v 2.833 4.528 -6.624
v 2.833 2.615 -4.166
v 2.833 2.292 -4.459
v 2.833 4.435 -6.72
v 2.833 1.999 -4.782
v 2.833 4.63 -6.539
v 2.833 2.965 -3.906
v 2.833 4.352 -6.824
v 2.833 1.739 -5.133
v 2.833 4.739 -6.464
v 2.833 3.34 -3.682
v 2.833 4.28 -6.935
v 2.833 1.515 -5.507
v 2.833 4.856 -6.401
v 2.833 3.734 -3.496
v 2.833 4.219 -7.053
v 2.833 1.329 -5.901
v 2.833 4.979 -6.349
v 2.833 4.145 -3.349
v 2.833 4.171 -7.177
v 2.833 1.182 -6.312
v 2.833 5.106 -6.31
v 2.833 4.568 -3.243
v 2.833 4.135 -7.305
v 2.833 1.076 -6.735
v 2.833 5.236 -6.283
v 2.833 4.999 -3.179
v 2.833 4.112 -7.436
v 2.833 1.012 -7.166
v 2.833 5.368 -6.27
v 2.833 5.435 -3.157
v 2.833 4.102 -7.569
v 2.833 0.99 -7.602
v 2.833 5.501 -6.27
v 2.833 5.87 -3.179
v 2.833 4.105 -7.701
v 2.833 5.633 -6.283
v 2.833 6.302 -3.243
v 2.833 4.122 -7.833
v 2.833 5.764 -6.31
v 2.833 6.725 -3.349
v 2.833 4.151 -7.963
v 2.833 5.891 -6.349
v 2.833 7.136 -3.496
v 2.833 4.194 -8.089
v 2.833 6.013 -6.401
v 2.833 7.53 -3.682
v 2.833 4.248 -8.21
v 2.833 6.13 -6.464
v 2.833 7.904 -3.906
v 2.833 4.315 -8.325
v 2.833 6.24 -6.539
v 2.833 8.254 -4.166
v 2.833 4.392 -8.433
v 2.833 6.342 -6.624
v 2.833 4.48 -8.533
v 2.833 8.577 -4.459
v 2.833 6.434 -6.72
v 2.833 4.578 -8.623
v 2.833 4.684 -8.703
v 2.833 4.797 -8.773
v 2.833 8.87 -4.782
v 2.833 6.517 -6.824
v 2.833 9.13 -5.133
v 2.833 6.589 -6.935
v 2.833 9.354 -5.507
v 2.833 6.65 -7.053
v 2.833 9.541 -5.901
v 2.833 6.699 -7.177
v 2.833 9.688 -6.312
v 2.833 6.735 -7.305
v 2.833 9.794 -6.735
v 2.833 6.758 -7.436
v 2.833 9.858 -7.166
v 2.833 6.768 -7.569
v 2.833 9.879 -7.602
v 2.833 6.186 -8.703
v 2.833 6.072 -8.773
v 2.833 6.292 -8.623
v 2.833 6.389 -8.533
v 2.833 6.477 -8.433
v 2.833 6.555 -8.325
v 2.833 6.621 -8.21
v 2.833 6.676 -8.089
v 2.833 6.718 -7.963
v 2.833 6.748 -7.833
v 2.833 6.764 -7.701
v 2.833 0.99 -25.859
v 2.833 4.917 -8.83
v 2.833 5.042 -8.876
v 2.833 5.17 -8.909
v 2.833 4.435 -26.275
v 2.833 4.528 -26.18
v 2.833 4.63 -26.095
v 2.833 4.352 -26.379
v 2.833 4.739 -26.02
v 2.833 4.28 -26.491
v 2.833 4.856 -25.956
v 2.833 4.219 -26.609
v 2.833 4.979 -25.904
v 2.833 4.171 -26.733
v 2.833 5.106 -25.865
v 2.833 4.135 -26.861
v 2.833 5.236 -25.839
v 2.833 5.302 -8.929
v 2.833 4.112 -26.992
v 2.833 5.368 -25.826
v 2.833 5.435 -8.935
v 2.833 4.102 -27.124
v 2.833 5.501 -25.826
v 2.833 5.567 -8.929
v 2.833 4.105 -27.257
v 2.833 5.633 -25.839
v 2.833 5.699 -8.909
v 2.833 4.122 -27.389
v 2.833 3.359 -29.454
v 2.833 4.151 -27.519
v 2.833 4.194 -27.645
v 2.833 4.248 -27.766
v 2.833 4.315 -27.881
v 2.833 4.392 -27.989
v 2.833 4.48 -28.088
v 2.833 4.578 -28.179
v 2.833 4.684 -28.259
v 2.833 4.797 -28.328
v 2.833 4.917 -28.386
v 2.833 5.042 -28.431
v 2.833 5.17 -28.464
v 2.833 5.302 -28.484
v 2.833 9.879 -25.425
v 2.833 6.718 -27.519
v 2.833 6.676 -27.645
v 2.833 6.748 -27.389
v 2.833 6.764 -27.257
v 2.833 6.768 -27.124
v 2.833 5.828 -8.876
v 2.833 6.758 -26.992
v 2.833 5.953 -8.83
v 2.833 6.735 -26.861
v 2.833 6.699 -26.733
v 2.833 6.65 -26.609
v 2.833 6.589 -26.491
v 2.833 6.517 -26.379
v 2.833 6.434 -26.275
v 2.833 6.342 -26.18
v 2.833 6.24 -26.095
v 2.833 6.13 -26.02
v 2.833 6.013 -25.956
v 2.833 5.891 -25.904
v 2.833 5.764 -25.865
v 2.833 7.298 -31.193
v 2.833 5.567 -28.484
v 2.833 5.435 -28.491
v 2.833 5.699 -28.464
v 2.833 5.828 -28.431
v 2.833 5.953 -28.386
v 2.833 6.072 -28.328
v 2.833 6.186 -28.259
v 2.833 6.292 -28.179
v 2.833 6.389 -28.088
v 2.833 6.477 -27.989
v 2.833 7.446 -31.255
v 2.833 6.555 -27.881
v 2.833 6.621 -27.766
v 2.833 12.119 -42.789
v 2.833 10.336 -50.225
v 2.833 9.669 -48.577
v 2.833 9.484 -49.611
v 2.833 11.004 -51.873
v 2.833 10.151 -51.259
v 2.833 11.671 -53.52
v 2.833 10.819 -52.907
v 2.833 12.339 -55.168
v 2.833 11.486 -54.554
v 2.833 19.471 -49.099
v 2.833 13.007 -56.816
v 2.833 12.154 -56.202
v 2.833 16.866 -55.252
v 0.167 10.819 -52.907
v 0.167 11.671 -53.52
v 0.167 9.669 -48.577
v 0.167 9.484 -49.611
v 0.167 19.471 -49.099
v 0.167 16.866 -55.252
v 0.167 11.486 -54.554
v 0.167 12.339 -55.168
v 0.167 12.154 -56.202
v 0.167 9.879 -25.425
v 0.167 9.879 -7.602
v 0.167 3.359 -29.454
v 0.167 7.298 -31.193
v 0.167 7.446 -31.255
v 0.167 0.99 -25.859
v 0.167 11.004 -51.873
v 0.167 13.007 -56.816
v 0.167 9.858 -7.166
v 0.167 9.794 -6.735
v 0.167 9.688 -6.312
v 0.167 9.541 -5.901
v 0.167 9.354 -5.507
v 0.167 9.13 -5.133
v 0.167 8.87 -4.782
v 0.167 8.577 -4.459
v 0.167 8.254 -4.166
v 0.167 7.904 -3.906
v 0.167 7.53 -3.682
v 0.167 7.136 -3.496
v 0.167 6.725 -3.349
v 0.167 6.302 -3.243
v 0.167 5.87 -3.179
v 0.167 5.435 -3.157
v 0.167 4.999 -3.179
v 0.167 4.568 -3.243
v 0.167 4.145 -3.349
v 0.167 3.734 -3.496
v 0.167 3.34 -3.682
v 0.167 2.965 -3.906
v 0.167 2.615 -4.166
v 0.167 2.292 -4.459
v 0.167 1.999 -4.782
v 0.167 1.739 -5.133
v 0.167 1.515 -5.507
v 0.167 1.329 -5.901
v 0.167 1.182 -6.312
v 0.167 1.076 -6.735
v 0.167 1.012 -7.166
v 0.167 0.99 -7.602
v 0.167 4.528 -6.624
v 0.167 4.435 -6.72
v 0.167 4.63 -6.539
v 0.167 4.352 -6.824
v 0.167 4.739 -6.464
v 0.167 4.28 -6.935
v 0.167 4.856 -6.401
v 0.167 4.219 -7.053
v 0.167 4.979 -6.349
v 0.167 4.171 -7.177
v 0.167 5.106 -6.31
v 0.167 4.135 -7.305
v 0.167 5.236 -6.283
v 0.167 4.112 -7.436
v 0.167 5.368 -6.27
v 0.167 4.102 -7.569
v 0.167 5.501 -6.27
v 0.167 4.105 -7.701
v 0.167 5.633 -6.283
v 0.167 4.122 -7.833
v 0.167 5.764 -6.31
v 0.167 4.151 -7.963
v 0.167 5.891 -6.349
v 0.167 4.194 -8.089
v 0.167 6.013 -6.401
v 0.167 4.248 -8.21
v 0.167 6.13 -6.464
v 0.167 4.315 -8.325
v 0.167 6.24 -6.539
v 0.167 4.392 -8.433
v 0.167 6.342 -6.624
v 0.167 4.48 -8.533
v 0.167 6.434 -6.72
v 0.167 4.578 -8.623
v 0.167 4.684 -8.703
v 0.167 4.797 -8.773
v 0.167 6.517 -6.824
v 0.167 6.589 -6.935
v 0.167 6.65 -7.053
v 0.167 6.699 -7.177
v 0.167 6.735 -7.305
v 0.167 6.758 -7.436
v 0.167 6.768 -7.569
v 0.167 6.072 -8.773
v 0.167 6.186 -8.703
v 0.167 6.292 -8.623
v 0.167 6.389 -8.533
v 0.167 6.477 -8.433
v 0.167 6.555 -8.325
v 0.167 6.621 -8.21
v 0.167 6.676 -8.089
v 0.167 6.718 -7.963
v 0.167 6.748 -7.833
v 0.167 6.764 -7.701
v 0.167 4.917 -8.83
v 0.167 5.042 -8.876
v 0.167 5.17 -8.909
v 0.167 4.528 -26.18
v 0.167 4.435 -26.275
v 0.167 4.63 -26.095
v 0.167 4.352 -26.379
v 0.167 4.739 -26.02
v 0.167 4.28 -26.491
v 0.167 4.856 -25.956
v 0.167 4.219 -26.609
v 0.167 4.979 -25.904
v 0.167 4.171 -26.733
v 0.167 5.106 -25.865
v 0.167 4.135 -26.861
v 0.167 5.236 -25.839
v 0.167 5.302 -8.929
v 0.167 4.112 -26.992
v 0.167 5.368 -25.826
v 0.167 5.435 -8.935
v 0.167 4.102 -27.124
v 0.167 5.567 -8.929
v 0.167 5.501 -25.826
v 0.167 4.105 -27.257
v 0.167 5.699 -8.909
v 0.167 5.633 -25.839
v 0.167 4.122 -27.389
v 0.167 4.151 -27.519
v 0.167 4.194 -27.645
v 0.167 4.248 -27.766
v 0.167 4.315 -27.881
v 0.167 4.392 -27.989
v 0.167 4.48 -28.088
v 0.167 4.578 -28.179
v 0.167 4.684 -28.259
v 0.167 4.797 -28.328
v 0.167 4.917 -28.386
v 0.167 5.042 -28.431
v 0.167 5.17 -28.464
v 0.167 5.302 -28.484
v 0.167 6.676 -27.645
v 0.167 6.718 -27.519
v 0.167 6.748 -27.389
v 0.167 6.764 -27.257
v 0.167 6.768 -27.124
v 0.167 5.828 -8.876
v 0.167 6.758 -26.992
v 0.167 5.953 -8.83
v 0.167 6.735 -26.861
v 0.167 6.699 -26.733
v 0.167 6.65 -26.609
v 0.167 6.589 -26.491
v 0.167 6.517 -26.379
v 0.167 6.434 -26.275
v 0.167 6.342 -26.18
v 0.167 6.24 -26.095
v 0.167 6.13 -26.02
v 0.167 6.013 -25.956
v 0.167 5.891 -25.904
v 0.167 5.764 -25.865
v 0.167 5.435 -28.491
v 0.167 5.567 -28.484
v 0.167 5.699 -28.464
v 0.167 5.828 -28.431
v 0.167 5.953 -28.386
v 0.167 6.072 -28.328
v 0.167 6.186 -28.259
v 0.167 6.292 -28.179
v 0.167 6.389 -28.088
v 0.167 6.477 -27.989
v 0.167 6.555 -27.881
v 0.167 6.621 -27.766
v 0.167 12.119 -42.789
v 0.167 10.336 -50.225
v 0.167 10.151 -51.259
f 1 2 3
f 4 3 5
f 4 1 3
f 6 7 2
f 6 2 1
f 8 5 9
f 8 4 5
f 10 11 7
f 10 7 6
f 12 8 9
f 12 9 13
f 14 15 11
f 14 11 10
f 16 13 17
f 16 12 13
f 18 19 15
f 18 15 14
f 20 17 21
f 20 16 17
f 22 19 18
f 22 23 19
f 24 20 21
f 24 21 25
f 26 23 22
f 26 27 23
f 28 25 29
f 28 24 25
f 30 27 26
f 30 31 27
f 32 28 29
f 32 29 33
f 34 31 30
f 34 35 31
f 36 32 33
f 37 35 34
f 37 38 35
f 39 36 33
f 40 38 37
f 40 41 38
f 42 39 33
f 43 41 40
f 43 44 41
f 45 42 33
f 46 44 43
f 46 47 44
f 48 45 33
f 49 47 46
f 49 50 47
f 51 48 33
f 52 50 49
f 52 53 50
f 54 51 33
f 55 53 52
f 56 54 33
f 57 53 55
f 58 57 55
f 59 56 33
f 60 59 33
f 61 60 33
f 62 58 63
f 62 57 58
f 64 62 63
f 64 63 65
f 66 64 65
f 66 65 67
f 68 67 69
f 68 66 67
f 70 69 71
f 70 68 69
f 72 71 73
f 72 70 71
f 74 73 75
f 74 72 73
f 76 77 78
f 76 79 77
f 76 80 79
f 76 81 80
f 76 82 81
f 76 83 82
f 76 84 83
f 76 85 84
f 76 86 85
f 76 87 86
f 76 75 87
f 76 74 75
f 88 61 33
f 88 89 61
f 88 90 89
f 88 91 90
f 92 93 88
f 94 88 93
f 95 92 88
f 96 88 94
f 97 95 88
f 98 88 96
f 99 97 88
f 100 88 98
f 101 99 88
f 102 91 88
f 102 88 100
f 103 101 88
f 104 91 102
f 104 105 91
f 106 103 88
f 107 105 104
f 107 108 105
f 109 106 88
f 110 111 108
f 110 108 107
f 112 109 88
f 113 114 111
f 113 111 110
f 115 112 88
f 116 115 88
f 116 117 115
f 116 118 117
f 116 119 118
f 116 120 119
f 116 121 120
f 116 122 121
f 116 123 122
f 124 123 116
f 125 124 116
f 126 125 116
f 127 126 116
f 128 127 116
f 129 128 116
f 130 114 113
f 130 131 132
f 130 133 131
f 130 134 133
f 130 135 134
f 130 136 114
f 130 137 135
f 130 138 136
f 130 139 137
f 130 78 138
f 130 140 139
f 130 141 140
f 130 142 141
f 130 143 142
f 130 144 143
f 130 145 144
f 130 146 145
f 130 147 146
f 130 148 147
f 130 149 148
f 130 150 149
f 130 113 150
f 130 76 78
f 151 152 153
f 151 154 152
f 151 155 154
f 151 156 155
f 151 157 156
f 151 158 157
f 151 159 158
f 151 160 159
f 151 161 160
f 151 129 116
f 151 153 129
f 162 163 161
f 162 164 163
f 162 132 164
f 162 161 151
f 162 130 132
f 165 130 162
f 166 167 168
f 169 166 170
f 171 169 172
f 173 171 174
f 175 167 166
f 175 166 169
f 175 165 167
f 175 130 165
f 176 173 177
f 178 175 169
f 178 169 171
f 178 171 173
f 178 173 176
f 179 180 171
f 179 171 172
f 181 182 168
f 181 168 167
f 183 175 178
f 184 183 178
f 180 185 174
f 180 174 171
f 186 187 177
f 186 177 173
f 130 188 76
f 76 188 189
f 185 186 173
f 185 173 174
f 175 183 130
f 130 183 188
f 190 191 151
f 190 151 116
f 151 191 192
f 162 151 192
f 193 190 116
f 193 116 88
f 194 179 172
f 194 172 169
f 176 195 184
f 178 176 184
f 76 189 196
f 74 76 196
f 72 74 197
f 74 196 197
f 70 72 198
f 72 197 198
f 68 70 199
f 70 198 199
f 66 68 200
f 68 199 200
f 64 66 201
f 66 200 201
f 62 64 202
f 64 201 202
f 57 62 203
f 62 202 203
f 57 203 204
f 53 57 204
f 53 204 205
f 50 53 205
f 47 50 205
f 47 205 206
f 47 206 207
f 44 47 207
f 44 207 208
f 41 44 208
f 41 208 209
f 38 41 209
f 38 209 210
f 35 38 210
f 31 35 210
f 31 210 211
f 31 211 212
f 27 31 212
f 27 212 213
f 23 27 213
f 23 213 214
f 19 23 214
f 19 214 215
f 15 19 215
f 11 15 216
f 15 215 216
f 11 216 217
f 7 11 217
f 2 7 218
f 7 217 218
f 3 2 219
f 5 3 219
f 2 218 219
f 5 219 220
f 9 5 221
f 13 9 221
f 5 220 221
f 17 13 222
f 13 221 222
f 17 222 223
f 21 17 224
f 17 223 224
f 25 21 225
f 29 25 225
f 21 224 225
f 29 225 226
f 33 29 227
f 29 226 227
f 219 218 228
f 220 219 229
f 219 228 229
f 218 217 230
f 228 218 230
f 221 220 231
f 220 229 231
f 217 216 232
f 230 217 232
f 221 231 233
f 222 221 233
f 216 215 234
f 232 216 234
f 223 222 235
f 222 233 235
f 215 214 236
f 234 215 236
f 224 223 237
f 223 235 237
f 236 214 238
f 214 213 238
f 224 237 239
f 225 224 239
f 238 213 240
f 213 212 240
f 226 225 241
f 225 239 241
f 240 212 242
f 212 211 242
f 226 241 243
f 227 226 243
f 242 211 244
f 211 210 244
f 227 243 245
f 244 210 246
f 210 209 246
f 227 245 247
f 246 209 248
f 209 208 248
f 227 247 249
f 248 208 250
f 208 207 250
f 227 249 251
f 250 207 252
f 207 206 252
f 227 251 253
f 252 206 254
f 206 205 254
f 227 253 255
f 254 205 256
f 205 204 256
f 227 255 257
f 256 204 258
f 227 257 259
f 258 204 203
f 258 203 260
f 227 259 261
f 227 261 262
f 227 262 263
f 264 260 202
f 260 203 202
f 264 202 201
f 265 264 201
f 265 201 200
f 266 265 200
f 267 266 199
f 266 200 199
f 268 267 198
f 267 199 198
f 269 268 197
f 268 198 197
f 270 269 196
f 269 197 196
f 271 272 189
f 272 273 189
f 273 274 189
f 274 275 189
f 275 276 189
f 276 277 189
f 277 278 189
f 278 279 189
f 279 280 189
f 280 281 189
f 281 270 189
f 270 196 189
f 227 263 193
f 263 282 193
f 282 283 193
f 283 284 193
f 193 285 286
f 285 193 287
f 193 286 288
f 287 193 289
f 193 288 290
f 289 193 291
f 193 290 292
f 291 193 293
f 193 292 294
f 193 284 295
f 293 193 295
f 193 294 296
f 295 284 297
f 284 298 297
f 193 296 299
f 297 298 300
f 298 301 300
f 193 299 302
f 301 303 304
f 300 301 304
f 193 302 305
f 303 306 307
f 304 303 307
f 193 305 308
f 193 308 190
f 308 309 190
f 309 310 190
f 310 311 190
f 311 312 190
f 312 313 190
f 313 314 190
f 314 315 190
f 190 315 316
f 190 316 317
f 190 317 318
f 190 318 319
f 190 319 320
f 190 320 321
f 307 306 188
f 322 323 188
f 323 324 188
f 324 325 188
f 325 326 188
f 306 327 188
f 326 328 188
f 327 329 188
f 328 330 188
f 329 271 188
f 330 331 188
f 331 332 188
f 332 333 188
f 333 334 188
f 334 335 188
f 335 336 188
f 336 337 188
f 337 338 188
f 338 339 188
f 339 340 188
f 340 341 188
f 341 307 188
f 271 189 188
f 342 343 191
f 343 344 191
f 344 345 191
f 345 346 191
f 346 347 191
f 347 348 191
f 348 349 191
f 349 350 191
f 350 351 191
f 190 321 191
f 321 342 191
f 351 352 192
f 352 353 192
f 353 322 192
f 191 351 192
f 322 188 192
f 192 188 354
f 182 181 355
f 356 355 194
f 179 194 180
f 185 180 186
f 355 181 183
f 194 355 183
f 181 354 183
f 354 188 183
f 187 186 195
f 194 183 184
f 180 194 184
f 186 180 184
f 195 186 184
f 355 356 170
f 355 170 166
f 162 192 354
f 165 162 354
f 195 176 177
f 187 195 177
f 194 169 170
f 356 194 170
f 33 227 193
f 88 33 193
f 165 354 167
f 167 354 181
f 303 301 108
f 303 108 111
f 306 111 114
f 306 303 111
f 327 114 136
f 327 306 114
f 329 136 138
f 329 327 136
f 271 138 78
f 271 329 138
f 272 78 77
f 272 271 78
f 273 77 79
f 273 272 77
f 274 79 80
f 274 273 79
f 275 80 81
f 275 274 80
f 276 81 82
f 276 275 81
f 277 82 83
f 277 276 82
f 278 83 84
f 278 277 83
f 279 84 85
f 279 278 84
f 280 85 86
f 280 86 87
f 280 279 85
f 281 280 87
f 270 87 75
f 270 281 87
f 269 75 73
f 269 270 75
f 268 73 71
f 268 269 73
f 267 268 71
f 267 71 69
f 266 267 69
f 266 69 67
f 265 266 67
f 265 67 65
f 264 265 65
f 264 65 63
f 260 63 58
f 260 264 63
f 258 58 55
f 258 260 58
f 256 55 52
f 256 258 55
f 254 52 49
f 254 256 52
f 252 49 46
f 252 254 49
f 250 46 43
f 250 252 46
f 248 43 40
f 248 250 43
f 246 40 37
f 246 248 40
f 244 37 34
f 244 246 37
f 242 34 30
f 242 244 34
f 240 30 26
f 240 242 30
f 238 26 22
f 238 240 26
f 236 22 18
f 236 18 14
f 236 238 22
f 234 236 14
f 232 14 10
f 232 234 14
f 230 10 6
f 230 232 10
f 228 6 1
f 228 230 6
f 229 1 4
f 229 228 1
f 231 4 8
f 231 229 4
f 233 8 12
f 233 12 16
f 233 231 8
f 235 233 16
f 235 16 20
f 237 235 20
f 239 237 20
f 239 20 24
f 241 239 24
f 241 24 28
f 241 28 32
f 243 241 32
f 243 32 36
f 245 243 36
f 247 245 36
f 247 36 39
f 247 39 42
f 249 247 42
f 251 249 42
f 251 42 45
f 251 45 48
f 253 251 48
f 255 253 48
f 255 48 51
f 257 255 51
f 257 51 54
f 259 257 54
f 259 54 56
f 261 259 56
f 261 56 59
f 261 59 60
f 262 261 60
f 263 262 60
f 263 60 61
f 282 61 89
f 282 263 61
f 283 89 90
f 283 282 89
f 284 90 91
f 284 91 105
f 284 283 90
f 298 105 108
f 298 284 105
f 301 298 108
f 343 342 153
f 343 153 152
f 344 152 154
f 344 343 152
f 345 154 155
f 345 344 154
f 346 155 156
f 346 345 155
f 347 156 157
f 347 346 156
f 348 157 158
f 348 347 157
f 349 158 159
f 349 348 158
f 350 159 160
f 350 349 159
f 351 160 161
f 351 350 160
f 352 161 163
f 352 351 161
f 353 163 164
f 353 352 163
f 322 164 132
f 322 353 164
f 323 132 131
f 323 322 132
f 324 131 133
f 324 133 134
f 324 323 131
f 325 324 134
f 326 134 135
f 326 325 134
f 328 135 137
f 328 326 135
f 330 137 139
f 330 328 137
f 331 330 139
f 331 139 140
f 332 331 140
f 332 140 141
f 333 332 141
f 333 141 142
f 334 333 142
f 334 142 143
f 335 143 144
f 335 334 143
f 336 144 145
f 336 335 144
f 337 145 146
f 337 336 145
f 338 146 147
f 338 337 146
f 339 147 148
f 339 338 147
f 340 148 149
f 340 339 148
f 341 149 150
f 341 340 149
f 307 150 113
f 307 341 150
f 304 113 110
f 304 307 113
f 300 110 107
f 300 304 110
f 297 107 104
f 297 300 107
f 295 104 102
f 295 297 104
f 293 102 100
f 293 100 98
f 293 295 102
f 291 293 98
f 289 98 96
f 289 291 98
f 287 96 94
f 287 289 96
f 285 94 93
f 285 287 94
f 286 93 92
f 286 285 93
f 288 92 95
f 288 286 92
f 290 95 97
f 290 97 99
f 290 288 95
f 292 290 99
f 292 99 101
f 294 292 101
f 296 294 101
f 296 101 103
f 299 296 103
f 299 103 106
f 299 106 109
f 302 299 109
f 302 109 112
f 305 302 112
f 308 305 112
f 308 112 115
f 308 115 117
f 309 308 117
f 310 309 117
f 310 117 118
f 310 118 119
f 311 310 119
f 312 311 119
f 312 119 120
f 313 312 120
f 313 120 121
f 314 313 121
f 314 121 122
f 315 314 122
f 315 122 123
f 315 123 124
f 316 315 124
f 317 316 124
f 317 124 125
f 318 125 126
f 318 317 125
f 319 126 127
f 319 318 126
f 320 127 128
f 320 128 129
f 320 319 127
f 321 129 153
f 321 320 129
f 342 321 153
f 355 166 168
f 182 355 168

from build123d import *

# Parameters (mm, degrees)
SKETCH1_R             = 5
SKETCH1_R_2           = 1.5
BOSS_EXTRUDE1_DEPTH   = 3
BOSS_EXTRUDE2_START   = -3
BOSS_EXTRUDE2_DEPTH   = 3
CUT_EXTRUDE2_DEPTH    = 65.81382707
CORTAR_EXTRUIR1_DEPTH = 3
SCALE1_SCALE          = 0.888888889


# Read off the part's stored shape, not the designer's step: Cortar-Extruir1
with BuildPart() as part:
    # Sketch1 → Boss-Extrude1 (new body)
    # profile 1 of 3: a face of its own
    with BuildSketch(Plane(origin=(0, 0, 0), x_dir=(0, 0, -1), z_dir=(1, 0, 0))):
        with Locations((5, 5)):
            Circle(SKETCH1_R)
        with Locations((5, 5)):
            Circle(SKETCH1_R_2, mode=Mode.SUBTRACT)
    # profile 2 of 3: a face of its own
    with BuildSketch(Plane(origin=(0, 0, 0), x_dir=(0, 0, -1), z_dir=(1, 0, 0))):
        with BuildLine():
            ThreePointArc((10, 5), (8.535533906, 1.464466094), (5, 0))
            Line((5, 0), (27, 0))
            ThreePointArc((27, 0), (22, 5), (27, 10))
            Line((27, 10), (5, 10))
            ThreePointArc((5, 10), (8.535533906, 8.535533906), (10, 5))
        make_face()
    # profile 3 of 3: a face of its own
    with BuildSketch(Plane(origin=(0, 0, 0), x_dir=(0, 0, -1), z_dir=(1, 0, 0))):
        with Locations((27, 5)):
            Circle(SKETCH1_R)
        with Locations((27, 5)):
            Circle(SKETCH1_R_2, mode=Mode.SUBTRACT)
    extrude(amount=BOSS_EXTRUDE1_DEPTH)

    # Sketch2 → Boss-Extrude2 (add)
    with BuildSketch(Plane(origin=(3, 0, 0), x_dir=(0, 0, -1), z_dir=(1, 0, 0)).offset(BOSS_EXTRUDE2_START)):
        with BuildLine():
            ThreePointArc((27, 10), (29.694507461, 9.21184396), (31.53953799, 7.095851816))
            Line((31.53953799, 7.095851816), (31.610157793, 7.262674791))
            Line((31.610157793, 7.262674791), (44.585599673, 12.519851602))
            Line((44.585599673, 12.519851602), (51.097249205, 9.763328363))
            Line((51.097249205, 9.763328363), (60.365421977, 13.518454657))
            Line((60.365421977, 13.518454657), (56.610295683, 22.786627428))
            Line((56.610295683, 22.786627428), (25.051124858, 10))
            Line((25.051124858, 10), (27, 10))
        make_face()
        Polygon((60.365421977, 13.518454657), (51.097249205, 9.763328363), (51.333822162, 9.179433479), (60.601994933, 12.934559772), align=None)
    extrude(amount=BOSS_EXTRUDE2_DEPTH)

    # Sketch4 → Cut-Extrude2 (cut, through all)
    with BuildSketch(Plane(origin=(3, 0, 0), x_dir=(0, 0, -1), z_dir=(1, 0, 0))):
        Polygon((56.610295683, 22.786627428), (51.684261855, 20.790777803), (58.606145308, 17.8605936), align=None)
    extrude(amount=-CUT_EXTRUDE2_DEPTH, mode=Mode.SUBTRACT)

    # Cortar-Extruir1 outline → Cortar-Extruir1 (cut)
    with BuildSketch(Plane.YZ):
        with BuildLine():
            ThreePointArc((0, -27), (2.305492538, -31.21184396), (7.095851816, -31.53953799))
            Line((7.095851816, -31.53953799), (2.664871714, -29.583874941))
            Line((2.664871714, -29.583874941), (0, -25.53953799))
            Line((0, -25.53953799), (0, -27))
        make_face()
        Polygon((13.518454657, -60.365421977), (12.559047143, -59.675177656), (12.934559772, -60.601994933), align=None)
        Polygon((12.767429398, -58.511787422), (11.808021884, -57.821543102), (12.559047143, -59.675177656), align=None)
        Polygon((12.01640414, -56.658152868), (11.056996626, -55.967908548), (11.808021884, -57.821543102), align=None)
        Polygon((11.265378881, -54.804518314), (10.305971367, -54.114273993), (11.056996626, -55.967908548), align=None)
        Polygon((10.514353622, -52.95088376), (9.554946108, -52.260639439), (10.305971367, -54.114273993), align=None)
        Polygon((9.554946108, -52.260639439), (9.763328363, -51.097249205), (9.179433479, -51.333822162), align=None)
    extrude(amount=CORTAR_EXTRUIR1_DEPTH, mode=Mode.SUBTRACT)


with BuildPart() as part_1:
    # Scale1: scaled about (1.5, 8.912185075, -28.416581742)
    add(part.part.scale(SCALE1_SCALE).moved(Location((0.166666667, 0.990242786, -3.157397971))))


solid = part_1.part
